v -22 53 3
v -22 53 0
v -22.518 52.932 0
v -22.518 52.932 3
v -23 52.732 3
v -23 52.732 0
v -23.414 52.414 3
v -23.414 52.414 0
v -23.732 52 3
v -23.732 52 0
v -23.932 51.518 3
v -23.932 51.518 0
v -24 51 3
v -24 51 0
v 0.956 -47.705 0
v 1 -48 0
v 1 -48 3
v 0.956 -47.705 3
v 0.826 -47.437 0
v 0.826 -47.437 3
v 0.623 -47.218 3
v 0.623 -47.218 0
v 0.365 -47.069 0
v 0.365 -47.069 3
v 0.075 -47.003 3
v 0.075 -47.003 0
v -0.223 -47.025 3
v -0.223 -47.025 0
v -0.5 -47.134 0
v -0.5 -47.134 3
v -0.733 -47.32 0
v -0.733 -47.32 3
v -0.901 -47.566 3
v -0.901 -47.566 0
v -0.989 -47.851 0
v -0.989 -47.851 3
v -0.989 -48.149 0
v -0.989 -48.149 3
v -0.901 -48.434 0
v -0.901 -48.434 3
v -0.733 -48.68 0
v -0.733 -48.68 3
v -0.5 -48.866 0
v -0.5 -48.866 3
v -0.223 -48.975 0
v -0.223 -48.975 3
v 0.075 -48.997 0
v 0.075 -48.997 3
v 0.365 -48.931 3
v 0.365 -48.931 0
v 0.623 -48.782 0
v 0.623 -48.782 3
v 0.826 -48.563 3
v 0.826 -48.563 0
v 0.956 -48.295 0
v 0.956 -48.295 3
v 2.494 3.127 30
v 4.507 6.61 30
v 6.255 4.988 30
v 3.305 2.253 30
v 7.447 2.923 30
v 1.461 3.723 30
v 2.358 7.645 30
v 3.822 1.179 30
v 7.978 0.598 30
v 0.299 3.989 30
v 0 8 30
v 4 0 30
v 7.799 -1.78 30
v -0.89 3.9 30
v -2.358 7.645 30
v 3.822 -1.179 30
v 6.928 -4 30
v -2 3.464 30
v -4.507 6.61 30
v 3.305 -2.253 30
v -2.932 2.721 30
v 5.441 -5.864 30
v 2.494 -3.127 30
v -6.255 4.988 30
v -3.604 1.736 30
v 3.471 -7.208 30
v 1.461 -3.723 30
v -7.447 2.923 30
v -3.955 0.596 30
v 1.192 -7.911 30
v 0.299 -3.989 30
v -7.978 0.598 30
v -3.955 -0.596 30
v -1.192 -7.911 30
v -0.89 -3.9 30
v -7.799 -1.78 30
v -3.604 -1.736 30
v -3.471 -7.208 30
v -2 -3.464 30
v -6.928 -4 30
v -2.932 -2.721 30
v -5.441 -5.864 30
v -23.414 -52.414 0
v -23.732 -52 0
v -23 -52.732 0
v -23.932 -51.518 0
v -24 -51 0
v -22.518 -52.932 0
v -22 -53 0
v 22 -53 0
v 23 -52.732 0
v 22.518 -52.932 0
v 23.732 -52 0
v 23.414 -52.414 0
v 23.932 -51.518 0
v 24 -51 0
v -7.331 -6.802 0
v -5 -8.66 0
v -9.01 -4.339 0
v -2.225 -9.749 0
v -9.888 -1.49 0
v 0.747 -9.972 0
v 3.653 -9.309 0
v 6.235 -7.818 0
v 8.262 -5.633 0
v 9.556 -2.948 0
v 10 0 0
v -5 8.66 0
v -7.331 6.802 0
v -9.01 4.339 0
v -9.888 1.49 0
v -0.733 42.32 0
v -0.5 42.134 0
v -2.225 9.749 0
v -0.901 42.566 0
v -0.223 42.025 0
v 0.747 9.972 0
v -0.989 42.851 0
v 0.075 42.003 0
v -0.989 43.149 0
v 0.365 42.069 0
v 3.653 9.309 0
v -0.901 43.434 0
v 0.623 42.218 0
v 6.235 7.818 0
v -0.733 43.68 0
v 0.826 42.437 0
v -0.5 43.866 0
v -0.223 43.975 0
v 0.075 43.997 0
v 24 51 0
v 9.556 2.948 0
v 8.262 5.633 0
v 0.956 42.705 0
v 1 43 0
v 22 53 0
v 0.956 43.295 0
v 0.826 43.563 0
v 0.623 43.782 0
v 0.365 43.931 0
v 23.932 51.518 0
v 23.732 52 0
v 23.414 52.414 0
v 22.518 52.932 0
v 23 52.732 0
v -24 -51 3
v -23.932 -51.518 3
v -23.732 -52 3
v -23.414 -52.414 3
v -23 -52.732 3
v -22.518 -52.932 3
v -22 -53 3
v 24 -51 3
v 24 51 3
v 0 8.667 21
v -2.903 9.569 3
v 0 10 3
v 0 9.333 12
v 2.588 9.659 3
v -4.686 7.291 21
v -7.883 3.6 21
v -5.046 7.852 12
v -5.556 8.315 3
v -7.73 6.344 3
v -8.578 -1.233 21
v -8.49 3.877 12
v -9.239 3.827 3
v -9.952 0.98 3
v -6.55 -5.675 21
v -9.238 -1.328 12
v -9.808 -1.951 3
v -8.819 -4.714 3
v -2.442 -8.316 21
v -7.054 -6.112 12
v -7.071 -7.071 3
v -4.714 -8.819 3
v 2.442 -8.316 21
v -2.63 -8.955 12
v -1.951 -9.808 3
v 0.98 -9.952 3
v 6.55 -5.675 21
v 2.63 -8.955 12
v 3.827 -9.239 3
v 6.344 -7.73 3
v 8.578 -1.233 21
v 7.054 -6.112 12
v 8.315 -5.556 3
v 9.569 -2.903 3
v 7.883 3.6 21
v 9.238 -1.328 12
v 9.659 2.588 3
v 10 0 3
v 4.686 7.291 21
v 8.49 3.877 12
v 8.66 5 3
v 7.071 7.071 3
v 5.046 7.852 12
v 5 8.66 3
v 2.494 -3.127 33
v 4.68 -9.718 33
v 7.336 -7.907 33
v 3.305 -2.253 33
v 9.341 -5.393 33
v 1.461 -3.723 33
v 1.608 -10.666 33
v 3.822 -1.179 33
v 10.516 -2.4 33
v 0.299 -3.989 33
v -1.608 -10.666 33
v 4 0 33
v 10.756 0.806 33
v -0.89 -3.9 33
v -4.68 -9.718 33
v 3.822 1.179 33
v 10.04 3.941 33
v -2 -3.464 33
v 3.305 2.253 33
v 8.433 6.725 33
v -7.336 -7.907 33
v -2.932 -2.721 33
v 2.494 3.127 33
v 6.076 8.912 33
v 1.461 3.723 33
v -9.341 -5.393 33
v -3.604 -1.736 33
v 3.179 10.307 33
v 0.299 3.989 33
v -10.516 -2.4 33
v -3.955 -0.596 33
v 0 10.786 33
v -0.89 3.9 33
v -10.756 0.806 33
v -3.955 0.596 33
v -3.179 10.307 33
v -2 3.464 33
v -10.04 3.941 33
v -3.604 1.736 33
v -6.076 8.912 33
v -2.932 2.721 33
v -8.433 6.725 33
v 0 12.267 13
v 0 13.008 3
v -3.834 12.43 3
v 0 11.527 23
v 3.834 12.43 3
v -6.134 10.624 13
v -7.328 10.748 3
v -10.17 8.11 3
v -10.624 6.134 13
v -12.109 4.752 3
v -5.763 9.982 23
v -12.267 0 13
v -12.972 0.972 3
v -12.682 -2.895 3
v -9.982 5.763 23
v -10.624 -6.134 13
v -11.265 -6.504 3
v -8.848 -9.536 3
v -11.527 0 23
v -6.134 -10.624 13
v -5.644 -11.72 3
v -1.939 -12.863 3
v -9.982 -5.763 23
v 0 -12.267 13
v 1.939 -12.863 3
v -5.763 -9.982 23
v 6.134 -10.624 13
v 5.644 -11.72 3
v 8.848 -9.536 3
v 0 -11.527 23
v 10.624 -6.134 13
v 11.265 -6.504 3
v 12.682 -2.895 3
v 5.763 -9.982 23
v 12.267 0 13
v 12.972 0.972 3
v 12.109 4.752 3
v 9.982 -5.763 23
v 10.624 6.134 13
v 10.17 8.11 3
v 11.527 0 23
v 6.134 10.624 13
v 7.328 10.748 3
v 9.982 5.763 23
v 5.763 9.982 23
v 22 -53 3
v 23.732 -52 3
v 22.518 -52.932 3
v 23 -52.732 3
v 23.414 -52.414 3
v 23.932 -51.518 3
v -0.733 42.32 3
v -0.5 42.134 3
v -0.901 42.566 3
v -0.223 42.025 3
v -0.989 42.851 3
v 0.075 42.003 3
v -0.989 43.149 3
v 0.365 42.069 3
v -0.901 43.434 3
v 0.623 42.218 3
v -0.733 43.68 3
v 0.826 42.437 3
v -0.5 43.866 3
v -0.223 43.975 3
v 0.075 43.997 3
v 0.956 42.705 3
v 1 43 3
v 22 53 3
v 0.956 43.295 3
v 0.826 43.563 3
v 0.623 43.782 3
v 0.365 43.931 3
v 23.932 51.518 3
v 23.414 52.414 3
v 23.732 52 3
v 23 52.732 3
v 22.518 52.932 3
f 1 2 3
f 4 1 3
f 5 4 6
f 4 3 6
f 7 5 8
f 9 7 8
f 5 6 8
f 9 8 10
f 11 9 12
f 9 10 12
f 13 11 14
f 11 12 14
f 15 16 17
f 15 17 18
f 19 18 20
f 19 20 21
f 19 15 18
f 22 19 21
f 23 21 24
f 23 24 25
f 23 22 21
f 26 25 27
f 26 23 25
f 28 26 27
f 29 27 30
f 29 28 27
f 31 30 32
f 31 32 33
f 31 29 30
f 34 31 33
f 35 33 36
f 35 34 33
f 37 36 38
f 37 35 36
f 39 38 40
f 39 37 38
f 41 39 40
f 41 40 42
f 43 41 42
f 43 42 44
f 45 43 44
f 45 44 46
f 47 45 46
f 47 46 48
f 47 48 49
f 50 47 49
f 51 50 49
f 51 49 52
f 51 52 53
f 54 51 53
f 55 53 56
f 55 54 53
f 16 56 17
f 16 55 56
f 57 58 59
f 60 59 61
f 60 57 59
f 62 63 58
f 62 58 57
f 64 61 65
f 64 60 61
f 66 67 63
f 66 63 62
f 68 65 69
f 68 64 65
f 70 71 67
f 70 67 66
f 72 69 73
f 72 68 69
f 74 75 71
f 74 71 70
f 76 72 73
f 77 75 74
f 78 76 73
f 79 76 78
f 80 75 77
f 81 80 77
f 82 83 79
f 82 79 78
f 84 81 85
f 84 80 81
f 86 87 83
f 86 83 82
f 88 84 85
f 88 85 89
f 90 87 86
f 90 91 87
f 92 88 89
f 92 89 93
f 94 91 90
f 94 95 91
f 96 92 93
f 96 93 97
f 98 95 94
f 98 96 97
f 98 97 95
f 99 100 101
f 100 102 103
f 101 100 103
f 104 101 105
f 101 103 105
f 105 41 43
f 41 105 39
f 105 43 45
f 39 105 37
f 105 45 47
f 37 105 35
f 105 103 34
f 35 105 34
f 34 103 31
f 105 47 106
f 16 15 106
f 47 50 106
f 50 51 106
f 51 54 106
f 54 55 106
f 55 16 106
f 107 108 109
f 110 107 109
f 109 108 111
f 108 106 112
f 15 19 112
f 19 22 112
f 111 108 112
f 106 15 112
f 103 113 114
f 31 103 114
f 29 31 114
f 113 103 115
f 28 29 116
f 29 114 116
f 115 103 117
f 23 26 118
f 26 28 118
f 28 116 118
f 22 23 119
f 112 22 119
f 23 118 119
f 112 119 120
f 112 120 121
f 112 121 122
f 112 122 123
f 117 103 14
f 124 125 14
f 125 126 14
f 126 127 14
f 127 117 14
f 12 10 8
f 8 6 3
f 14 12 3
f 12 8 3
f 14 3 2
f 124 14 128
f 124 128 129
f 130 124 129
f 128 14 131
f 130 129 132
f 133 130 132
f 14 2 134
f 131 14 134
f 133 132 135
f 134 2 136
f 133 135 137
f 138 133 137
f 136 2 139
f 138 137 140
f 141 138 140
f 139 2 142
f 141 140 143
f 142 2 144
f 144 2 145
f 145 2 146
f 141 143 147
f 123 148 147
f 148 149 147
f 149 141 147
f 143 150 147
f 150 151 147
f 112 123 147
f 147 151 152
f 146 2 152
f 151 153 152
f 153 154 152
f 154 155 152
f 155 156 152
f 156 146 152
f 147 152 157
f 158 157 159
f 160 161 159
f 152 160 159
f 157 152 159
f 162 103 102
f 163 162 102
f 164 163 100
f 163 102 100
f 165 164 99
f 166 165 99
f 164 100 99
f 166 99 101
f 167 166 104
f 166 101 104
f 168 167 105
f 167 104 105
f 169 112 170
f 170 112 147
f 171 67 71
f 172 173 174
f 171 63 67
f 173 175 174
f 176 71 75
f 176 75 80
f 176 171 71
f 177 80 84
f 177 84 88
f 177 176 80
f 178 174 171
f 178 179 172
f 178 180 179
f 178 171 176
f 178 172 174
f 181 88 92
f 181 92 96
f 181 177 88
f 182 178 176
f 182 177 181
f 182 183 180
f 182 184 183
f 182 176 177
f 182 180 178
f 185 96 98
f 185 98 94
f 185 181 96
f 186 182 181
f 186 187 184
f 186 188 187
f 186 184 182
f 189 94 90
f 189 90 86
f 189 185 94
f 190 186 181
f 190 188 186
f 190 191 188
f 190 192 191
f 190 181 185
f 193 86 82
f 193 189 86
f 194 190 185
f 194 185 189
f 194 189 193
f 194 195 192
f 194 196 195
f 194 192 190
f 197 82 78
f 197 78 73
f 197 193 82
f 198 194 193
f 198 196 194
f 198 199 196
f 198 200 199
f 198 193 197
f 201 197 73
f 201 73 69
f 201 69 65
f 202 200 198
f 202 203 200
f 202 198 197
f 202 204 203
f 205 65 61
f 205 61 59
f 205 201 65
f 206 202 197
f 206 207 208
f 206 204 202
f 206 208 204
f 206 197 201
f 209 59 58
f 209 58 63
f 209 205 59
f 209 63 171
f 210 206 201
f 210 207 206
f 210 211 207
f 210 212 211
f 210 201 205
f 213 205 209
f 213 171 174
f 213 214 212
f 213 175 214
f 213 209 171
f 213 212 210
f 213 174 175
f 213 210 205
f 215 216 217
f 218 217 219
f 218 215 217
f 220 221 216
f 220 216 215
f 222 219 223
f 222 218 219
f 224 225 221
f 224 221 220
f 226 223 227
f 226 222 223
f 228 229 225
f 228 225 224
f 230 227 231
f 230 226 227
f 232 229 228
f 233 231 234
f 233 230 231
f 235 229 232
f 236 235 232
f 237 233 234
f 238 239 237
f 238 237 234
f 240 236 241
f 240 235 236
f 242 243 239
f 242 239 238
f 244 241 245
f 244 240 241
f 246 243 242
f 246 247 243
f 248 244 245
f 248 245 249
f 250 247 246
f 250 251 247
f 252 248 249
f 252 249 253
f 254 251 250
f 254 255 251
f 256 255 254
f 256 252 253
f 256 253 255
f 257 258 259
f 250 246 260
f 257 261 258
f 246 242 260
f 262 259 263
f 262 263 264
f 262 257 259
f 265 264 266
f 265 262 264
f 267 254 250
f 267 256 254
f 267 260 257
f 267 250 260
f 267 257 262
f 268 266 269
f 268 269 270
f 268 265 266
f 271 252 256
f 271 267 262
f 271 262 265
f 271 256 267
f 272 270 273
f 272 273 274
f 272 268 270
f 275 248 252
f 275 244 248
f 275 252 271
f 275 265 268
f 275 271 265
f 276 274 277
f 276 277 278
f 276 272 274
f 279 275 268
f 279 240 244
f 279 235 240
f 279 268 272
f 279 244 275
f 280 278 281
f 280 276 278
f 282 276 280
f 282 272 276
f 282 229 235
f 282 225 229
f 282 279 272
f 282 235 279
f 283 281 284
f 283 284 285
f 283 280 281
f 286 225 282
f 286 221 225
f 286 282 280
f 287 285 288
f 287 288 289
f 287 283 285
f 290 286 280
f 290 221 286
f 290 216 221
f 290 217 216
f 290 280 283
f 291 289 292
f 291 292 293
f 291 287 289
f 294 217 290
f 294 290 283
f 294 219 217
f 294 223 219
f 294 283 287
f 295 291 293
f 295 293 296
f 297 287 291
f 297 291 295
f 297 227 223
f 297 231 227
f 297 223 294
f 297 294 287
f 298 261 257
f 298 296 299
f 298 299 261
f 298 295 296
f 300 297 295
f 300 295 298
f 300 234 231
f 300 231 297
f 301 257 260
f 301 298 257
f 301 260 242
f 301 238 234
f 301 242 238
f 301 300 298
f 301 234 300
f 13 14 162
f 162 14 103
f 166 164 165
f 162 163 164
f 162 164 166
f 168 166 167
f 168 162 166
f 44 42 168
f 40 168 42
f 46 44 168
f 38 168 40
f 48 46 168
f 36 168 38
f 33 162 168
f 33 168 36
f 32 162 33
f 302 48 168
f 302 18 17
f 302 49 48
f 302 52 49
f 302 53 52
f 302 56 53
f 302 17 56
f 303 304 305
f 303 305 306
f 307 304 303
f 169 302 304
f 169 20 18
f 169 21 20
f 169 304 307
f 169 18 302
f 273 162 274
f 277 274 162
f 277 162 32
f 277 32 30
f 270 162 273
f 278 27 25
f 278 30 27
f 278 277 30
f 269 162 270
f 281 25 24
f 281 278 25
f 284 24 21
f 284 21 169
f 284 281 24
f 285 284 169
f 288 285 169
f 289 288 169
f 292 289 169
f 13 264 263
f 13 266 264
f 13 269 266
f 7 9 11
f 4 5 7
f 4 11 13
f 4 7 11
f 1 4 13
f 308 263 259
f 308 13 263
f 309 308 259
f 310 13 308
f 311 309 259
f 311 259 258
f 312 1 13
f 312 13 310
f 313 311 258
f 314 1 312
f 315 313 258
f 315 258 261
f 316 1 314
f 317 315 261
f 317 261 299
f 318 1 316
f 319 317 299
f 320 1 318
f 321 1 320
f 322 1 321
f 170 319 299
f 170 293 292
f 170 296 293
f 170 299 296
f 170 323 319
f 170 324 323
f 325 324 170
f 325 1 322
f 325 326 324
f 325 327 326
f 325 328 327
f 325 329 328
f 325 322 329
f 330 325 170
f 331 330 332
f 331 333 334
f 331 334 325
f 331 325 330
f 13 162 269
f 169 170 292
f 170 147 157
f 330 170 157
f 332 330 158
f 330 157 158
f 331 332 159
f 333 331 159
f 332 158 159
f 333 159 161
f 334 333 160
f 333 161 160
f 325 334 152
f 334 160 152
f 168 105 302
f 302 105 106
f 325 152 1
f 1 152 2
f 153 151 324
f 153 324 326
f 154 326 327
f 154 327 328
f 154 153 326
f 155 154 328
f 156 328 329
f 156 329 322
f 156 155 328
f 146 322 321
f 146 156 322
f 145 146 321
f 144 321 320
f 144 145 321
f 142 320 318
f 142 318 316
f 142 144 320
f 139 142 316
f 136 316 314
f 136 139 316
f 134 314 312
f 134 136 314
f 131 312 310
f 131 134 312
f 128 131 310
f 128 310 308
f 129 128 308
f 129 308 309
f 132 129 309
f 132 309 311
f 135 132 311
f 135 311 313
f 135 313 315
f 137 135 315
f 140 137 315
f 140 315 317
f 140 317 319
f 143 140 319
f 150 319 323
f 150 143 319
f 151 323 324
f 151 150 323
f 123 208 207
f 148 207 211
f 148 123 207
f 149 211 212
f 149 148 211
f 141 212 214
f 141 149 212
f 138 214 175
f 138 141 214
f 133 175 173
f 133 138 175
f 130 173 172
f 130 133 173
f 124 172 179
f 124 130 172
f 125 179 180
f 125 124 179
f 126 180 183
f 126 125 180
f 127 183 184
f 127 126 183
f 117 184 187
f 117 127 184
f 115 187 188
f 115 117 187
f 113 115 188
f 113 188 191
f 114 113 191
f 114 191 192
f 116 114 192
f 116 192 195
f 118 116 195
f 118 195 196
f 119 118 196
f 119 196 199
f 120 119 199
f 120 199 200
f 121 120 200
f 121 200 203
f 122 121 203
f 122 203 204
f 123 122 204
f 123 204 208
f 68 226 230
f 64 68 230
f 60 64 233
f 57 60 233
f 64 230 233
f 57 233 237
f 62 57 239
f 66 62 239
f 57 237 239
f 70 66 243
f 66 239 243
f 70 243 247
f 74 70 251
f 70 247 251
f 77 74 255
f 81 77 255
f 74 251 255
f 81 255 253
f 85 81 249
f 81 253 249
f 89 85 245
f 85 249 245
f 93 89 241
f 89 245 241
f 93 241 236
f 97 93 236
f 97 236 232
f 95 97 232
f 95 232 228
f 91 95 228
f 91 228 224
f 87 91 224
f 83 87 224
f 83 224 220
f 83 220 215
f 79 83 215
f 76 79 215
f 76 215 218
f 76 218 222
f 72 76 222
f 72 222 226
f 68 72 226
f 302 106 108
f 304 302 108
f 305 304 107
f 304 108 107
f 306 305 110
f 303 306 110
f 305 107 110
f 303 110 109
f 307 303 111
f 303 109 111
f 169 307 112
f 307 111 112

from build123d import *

# Parameters (mm, degrees)
F0_R     = 1
F0_R_2   = 10
F1_DEPTH = 3
F4_R     = 4
F5_DEPTH = 33.001


with BuildPart() as f1:
    # F0 (on Top) → F1 (new body)
    with BuildSketch(Plane.XY):
        with BuildLine():
            Line((22, 53), (-22, 53))
            ThreePointArc((-22, 53), (-23.414214, 52.414214), (-24, 51))
            Line((-24, 51), (-24, -51))
            ThreePointArc((-24, -51), (-23.414214, -52.414214), (-22, -53))
            Line((-22, -53), (22, -53))
            ThreePointArc((22, -53), (23.414214, -52.414214), (24, -51))
            Line((24, -51), (24, 51))
            ThreePointArc((24, 51), (23.414214, 52.414214), (22, 53))
        make_face()
        with Locations((0, -48)):
            Circle(F0_R, mode=Mode.SUBTRACT)
        Circle(F0_R_2, mode=Mode.SUBTRACT)
        with Locations((0, 43)):
            Circle(F0_R, mode=Mode.SUBTRACT)
    extrude(amount=F1_DEPTH)

    # F2 (on Right) → F3 (revolve)
    with BuildSketch(Plane.YZ):
        Polygon((8, 30), (10, 3), (13.008219, 3), (10.785997, 33), (0, 33), (0, 30), align=None)
    revolve(axis=Axis((0, 0, 4.326884), (0, 0, 1)))

    # F4 (on face) → F5 (cut, through all)
    with BuildSketch(Plane.XY.offset(33)):
        Circle(F4_R)
    extrude(amount=-F5_DEPTH, mode=Mode.SUBTRACT)


solid = f1.part
